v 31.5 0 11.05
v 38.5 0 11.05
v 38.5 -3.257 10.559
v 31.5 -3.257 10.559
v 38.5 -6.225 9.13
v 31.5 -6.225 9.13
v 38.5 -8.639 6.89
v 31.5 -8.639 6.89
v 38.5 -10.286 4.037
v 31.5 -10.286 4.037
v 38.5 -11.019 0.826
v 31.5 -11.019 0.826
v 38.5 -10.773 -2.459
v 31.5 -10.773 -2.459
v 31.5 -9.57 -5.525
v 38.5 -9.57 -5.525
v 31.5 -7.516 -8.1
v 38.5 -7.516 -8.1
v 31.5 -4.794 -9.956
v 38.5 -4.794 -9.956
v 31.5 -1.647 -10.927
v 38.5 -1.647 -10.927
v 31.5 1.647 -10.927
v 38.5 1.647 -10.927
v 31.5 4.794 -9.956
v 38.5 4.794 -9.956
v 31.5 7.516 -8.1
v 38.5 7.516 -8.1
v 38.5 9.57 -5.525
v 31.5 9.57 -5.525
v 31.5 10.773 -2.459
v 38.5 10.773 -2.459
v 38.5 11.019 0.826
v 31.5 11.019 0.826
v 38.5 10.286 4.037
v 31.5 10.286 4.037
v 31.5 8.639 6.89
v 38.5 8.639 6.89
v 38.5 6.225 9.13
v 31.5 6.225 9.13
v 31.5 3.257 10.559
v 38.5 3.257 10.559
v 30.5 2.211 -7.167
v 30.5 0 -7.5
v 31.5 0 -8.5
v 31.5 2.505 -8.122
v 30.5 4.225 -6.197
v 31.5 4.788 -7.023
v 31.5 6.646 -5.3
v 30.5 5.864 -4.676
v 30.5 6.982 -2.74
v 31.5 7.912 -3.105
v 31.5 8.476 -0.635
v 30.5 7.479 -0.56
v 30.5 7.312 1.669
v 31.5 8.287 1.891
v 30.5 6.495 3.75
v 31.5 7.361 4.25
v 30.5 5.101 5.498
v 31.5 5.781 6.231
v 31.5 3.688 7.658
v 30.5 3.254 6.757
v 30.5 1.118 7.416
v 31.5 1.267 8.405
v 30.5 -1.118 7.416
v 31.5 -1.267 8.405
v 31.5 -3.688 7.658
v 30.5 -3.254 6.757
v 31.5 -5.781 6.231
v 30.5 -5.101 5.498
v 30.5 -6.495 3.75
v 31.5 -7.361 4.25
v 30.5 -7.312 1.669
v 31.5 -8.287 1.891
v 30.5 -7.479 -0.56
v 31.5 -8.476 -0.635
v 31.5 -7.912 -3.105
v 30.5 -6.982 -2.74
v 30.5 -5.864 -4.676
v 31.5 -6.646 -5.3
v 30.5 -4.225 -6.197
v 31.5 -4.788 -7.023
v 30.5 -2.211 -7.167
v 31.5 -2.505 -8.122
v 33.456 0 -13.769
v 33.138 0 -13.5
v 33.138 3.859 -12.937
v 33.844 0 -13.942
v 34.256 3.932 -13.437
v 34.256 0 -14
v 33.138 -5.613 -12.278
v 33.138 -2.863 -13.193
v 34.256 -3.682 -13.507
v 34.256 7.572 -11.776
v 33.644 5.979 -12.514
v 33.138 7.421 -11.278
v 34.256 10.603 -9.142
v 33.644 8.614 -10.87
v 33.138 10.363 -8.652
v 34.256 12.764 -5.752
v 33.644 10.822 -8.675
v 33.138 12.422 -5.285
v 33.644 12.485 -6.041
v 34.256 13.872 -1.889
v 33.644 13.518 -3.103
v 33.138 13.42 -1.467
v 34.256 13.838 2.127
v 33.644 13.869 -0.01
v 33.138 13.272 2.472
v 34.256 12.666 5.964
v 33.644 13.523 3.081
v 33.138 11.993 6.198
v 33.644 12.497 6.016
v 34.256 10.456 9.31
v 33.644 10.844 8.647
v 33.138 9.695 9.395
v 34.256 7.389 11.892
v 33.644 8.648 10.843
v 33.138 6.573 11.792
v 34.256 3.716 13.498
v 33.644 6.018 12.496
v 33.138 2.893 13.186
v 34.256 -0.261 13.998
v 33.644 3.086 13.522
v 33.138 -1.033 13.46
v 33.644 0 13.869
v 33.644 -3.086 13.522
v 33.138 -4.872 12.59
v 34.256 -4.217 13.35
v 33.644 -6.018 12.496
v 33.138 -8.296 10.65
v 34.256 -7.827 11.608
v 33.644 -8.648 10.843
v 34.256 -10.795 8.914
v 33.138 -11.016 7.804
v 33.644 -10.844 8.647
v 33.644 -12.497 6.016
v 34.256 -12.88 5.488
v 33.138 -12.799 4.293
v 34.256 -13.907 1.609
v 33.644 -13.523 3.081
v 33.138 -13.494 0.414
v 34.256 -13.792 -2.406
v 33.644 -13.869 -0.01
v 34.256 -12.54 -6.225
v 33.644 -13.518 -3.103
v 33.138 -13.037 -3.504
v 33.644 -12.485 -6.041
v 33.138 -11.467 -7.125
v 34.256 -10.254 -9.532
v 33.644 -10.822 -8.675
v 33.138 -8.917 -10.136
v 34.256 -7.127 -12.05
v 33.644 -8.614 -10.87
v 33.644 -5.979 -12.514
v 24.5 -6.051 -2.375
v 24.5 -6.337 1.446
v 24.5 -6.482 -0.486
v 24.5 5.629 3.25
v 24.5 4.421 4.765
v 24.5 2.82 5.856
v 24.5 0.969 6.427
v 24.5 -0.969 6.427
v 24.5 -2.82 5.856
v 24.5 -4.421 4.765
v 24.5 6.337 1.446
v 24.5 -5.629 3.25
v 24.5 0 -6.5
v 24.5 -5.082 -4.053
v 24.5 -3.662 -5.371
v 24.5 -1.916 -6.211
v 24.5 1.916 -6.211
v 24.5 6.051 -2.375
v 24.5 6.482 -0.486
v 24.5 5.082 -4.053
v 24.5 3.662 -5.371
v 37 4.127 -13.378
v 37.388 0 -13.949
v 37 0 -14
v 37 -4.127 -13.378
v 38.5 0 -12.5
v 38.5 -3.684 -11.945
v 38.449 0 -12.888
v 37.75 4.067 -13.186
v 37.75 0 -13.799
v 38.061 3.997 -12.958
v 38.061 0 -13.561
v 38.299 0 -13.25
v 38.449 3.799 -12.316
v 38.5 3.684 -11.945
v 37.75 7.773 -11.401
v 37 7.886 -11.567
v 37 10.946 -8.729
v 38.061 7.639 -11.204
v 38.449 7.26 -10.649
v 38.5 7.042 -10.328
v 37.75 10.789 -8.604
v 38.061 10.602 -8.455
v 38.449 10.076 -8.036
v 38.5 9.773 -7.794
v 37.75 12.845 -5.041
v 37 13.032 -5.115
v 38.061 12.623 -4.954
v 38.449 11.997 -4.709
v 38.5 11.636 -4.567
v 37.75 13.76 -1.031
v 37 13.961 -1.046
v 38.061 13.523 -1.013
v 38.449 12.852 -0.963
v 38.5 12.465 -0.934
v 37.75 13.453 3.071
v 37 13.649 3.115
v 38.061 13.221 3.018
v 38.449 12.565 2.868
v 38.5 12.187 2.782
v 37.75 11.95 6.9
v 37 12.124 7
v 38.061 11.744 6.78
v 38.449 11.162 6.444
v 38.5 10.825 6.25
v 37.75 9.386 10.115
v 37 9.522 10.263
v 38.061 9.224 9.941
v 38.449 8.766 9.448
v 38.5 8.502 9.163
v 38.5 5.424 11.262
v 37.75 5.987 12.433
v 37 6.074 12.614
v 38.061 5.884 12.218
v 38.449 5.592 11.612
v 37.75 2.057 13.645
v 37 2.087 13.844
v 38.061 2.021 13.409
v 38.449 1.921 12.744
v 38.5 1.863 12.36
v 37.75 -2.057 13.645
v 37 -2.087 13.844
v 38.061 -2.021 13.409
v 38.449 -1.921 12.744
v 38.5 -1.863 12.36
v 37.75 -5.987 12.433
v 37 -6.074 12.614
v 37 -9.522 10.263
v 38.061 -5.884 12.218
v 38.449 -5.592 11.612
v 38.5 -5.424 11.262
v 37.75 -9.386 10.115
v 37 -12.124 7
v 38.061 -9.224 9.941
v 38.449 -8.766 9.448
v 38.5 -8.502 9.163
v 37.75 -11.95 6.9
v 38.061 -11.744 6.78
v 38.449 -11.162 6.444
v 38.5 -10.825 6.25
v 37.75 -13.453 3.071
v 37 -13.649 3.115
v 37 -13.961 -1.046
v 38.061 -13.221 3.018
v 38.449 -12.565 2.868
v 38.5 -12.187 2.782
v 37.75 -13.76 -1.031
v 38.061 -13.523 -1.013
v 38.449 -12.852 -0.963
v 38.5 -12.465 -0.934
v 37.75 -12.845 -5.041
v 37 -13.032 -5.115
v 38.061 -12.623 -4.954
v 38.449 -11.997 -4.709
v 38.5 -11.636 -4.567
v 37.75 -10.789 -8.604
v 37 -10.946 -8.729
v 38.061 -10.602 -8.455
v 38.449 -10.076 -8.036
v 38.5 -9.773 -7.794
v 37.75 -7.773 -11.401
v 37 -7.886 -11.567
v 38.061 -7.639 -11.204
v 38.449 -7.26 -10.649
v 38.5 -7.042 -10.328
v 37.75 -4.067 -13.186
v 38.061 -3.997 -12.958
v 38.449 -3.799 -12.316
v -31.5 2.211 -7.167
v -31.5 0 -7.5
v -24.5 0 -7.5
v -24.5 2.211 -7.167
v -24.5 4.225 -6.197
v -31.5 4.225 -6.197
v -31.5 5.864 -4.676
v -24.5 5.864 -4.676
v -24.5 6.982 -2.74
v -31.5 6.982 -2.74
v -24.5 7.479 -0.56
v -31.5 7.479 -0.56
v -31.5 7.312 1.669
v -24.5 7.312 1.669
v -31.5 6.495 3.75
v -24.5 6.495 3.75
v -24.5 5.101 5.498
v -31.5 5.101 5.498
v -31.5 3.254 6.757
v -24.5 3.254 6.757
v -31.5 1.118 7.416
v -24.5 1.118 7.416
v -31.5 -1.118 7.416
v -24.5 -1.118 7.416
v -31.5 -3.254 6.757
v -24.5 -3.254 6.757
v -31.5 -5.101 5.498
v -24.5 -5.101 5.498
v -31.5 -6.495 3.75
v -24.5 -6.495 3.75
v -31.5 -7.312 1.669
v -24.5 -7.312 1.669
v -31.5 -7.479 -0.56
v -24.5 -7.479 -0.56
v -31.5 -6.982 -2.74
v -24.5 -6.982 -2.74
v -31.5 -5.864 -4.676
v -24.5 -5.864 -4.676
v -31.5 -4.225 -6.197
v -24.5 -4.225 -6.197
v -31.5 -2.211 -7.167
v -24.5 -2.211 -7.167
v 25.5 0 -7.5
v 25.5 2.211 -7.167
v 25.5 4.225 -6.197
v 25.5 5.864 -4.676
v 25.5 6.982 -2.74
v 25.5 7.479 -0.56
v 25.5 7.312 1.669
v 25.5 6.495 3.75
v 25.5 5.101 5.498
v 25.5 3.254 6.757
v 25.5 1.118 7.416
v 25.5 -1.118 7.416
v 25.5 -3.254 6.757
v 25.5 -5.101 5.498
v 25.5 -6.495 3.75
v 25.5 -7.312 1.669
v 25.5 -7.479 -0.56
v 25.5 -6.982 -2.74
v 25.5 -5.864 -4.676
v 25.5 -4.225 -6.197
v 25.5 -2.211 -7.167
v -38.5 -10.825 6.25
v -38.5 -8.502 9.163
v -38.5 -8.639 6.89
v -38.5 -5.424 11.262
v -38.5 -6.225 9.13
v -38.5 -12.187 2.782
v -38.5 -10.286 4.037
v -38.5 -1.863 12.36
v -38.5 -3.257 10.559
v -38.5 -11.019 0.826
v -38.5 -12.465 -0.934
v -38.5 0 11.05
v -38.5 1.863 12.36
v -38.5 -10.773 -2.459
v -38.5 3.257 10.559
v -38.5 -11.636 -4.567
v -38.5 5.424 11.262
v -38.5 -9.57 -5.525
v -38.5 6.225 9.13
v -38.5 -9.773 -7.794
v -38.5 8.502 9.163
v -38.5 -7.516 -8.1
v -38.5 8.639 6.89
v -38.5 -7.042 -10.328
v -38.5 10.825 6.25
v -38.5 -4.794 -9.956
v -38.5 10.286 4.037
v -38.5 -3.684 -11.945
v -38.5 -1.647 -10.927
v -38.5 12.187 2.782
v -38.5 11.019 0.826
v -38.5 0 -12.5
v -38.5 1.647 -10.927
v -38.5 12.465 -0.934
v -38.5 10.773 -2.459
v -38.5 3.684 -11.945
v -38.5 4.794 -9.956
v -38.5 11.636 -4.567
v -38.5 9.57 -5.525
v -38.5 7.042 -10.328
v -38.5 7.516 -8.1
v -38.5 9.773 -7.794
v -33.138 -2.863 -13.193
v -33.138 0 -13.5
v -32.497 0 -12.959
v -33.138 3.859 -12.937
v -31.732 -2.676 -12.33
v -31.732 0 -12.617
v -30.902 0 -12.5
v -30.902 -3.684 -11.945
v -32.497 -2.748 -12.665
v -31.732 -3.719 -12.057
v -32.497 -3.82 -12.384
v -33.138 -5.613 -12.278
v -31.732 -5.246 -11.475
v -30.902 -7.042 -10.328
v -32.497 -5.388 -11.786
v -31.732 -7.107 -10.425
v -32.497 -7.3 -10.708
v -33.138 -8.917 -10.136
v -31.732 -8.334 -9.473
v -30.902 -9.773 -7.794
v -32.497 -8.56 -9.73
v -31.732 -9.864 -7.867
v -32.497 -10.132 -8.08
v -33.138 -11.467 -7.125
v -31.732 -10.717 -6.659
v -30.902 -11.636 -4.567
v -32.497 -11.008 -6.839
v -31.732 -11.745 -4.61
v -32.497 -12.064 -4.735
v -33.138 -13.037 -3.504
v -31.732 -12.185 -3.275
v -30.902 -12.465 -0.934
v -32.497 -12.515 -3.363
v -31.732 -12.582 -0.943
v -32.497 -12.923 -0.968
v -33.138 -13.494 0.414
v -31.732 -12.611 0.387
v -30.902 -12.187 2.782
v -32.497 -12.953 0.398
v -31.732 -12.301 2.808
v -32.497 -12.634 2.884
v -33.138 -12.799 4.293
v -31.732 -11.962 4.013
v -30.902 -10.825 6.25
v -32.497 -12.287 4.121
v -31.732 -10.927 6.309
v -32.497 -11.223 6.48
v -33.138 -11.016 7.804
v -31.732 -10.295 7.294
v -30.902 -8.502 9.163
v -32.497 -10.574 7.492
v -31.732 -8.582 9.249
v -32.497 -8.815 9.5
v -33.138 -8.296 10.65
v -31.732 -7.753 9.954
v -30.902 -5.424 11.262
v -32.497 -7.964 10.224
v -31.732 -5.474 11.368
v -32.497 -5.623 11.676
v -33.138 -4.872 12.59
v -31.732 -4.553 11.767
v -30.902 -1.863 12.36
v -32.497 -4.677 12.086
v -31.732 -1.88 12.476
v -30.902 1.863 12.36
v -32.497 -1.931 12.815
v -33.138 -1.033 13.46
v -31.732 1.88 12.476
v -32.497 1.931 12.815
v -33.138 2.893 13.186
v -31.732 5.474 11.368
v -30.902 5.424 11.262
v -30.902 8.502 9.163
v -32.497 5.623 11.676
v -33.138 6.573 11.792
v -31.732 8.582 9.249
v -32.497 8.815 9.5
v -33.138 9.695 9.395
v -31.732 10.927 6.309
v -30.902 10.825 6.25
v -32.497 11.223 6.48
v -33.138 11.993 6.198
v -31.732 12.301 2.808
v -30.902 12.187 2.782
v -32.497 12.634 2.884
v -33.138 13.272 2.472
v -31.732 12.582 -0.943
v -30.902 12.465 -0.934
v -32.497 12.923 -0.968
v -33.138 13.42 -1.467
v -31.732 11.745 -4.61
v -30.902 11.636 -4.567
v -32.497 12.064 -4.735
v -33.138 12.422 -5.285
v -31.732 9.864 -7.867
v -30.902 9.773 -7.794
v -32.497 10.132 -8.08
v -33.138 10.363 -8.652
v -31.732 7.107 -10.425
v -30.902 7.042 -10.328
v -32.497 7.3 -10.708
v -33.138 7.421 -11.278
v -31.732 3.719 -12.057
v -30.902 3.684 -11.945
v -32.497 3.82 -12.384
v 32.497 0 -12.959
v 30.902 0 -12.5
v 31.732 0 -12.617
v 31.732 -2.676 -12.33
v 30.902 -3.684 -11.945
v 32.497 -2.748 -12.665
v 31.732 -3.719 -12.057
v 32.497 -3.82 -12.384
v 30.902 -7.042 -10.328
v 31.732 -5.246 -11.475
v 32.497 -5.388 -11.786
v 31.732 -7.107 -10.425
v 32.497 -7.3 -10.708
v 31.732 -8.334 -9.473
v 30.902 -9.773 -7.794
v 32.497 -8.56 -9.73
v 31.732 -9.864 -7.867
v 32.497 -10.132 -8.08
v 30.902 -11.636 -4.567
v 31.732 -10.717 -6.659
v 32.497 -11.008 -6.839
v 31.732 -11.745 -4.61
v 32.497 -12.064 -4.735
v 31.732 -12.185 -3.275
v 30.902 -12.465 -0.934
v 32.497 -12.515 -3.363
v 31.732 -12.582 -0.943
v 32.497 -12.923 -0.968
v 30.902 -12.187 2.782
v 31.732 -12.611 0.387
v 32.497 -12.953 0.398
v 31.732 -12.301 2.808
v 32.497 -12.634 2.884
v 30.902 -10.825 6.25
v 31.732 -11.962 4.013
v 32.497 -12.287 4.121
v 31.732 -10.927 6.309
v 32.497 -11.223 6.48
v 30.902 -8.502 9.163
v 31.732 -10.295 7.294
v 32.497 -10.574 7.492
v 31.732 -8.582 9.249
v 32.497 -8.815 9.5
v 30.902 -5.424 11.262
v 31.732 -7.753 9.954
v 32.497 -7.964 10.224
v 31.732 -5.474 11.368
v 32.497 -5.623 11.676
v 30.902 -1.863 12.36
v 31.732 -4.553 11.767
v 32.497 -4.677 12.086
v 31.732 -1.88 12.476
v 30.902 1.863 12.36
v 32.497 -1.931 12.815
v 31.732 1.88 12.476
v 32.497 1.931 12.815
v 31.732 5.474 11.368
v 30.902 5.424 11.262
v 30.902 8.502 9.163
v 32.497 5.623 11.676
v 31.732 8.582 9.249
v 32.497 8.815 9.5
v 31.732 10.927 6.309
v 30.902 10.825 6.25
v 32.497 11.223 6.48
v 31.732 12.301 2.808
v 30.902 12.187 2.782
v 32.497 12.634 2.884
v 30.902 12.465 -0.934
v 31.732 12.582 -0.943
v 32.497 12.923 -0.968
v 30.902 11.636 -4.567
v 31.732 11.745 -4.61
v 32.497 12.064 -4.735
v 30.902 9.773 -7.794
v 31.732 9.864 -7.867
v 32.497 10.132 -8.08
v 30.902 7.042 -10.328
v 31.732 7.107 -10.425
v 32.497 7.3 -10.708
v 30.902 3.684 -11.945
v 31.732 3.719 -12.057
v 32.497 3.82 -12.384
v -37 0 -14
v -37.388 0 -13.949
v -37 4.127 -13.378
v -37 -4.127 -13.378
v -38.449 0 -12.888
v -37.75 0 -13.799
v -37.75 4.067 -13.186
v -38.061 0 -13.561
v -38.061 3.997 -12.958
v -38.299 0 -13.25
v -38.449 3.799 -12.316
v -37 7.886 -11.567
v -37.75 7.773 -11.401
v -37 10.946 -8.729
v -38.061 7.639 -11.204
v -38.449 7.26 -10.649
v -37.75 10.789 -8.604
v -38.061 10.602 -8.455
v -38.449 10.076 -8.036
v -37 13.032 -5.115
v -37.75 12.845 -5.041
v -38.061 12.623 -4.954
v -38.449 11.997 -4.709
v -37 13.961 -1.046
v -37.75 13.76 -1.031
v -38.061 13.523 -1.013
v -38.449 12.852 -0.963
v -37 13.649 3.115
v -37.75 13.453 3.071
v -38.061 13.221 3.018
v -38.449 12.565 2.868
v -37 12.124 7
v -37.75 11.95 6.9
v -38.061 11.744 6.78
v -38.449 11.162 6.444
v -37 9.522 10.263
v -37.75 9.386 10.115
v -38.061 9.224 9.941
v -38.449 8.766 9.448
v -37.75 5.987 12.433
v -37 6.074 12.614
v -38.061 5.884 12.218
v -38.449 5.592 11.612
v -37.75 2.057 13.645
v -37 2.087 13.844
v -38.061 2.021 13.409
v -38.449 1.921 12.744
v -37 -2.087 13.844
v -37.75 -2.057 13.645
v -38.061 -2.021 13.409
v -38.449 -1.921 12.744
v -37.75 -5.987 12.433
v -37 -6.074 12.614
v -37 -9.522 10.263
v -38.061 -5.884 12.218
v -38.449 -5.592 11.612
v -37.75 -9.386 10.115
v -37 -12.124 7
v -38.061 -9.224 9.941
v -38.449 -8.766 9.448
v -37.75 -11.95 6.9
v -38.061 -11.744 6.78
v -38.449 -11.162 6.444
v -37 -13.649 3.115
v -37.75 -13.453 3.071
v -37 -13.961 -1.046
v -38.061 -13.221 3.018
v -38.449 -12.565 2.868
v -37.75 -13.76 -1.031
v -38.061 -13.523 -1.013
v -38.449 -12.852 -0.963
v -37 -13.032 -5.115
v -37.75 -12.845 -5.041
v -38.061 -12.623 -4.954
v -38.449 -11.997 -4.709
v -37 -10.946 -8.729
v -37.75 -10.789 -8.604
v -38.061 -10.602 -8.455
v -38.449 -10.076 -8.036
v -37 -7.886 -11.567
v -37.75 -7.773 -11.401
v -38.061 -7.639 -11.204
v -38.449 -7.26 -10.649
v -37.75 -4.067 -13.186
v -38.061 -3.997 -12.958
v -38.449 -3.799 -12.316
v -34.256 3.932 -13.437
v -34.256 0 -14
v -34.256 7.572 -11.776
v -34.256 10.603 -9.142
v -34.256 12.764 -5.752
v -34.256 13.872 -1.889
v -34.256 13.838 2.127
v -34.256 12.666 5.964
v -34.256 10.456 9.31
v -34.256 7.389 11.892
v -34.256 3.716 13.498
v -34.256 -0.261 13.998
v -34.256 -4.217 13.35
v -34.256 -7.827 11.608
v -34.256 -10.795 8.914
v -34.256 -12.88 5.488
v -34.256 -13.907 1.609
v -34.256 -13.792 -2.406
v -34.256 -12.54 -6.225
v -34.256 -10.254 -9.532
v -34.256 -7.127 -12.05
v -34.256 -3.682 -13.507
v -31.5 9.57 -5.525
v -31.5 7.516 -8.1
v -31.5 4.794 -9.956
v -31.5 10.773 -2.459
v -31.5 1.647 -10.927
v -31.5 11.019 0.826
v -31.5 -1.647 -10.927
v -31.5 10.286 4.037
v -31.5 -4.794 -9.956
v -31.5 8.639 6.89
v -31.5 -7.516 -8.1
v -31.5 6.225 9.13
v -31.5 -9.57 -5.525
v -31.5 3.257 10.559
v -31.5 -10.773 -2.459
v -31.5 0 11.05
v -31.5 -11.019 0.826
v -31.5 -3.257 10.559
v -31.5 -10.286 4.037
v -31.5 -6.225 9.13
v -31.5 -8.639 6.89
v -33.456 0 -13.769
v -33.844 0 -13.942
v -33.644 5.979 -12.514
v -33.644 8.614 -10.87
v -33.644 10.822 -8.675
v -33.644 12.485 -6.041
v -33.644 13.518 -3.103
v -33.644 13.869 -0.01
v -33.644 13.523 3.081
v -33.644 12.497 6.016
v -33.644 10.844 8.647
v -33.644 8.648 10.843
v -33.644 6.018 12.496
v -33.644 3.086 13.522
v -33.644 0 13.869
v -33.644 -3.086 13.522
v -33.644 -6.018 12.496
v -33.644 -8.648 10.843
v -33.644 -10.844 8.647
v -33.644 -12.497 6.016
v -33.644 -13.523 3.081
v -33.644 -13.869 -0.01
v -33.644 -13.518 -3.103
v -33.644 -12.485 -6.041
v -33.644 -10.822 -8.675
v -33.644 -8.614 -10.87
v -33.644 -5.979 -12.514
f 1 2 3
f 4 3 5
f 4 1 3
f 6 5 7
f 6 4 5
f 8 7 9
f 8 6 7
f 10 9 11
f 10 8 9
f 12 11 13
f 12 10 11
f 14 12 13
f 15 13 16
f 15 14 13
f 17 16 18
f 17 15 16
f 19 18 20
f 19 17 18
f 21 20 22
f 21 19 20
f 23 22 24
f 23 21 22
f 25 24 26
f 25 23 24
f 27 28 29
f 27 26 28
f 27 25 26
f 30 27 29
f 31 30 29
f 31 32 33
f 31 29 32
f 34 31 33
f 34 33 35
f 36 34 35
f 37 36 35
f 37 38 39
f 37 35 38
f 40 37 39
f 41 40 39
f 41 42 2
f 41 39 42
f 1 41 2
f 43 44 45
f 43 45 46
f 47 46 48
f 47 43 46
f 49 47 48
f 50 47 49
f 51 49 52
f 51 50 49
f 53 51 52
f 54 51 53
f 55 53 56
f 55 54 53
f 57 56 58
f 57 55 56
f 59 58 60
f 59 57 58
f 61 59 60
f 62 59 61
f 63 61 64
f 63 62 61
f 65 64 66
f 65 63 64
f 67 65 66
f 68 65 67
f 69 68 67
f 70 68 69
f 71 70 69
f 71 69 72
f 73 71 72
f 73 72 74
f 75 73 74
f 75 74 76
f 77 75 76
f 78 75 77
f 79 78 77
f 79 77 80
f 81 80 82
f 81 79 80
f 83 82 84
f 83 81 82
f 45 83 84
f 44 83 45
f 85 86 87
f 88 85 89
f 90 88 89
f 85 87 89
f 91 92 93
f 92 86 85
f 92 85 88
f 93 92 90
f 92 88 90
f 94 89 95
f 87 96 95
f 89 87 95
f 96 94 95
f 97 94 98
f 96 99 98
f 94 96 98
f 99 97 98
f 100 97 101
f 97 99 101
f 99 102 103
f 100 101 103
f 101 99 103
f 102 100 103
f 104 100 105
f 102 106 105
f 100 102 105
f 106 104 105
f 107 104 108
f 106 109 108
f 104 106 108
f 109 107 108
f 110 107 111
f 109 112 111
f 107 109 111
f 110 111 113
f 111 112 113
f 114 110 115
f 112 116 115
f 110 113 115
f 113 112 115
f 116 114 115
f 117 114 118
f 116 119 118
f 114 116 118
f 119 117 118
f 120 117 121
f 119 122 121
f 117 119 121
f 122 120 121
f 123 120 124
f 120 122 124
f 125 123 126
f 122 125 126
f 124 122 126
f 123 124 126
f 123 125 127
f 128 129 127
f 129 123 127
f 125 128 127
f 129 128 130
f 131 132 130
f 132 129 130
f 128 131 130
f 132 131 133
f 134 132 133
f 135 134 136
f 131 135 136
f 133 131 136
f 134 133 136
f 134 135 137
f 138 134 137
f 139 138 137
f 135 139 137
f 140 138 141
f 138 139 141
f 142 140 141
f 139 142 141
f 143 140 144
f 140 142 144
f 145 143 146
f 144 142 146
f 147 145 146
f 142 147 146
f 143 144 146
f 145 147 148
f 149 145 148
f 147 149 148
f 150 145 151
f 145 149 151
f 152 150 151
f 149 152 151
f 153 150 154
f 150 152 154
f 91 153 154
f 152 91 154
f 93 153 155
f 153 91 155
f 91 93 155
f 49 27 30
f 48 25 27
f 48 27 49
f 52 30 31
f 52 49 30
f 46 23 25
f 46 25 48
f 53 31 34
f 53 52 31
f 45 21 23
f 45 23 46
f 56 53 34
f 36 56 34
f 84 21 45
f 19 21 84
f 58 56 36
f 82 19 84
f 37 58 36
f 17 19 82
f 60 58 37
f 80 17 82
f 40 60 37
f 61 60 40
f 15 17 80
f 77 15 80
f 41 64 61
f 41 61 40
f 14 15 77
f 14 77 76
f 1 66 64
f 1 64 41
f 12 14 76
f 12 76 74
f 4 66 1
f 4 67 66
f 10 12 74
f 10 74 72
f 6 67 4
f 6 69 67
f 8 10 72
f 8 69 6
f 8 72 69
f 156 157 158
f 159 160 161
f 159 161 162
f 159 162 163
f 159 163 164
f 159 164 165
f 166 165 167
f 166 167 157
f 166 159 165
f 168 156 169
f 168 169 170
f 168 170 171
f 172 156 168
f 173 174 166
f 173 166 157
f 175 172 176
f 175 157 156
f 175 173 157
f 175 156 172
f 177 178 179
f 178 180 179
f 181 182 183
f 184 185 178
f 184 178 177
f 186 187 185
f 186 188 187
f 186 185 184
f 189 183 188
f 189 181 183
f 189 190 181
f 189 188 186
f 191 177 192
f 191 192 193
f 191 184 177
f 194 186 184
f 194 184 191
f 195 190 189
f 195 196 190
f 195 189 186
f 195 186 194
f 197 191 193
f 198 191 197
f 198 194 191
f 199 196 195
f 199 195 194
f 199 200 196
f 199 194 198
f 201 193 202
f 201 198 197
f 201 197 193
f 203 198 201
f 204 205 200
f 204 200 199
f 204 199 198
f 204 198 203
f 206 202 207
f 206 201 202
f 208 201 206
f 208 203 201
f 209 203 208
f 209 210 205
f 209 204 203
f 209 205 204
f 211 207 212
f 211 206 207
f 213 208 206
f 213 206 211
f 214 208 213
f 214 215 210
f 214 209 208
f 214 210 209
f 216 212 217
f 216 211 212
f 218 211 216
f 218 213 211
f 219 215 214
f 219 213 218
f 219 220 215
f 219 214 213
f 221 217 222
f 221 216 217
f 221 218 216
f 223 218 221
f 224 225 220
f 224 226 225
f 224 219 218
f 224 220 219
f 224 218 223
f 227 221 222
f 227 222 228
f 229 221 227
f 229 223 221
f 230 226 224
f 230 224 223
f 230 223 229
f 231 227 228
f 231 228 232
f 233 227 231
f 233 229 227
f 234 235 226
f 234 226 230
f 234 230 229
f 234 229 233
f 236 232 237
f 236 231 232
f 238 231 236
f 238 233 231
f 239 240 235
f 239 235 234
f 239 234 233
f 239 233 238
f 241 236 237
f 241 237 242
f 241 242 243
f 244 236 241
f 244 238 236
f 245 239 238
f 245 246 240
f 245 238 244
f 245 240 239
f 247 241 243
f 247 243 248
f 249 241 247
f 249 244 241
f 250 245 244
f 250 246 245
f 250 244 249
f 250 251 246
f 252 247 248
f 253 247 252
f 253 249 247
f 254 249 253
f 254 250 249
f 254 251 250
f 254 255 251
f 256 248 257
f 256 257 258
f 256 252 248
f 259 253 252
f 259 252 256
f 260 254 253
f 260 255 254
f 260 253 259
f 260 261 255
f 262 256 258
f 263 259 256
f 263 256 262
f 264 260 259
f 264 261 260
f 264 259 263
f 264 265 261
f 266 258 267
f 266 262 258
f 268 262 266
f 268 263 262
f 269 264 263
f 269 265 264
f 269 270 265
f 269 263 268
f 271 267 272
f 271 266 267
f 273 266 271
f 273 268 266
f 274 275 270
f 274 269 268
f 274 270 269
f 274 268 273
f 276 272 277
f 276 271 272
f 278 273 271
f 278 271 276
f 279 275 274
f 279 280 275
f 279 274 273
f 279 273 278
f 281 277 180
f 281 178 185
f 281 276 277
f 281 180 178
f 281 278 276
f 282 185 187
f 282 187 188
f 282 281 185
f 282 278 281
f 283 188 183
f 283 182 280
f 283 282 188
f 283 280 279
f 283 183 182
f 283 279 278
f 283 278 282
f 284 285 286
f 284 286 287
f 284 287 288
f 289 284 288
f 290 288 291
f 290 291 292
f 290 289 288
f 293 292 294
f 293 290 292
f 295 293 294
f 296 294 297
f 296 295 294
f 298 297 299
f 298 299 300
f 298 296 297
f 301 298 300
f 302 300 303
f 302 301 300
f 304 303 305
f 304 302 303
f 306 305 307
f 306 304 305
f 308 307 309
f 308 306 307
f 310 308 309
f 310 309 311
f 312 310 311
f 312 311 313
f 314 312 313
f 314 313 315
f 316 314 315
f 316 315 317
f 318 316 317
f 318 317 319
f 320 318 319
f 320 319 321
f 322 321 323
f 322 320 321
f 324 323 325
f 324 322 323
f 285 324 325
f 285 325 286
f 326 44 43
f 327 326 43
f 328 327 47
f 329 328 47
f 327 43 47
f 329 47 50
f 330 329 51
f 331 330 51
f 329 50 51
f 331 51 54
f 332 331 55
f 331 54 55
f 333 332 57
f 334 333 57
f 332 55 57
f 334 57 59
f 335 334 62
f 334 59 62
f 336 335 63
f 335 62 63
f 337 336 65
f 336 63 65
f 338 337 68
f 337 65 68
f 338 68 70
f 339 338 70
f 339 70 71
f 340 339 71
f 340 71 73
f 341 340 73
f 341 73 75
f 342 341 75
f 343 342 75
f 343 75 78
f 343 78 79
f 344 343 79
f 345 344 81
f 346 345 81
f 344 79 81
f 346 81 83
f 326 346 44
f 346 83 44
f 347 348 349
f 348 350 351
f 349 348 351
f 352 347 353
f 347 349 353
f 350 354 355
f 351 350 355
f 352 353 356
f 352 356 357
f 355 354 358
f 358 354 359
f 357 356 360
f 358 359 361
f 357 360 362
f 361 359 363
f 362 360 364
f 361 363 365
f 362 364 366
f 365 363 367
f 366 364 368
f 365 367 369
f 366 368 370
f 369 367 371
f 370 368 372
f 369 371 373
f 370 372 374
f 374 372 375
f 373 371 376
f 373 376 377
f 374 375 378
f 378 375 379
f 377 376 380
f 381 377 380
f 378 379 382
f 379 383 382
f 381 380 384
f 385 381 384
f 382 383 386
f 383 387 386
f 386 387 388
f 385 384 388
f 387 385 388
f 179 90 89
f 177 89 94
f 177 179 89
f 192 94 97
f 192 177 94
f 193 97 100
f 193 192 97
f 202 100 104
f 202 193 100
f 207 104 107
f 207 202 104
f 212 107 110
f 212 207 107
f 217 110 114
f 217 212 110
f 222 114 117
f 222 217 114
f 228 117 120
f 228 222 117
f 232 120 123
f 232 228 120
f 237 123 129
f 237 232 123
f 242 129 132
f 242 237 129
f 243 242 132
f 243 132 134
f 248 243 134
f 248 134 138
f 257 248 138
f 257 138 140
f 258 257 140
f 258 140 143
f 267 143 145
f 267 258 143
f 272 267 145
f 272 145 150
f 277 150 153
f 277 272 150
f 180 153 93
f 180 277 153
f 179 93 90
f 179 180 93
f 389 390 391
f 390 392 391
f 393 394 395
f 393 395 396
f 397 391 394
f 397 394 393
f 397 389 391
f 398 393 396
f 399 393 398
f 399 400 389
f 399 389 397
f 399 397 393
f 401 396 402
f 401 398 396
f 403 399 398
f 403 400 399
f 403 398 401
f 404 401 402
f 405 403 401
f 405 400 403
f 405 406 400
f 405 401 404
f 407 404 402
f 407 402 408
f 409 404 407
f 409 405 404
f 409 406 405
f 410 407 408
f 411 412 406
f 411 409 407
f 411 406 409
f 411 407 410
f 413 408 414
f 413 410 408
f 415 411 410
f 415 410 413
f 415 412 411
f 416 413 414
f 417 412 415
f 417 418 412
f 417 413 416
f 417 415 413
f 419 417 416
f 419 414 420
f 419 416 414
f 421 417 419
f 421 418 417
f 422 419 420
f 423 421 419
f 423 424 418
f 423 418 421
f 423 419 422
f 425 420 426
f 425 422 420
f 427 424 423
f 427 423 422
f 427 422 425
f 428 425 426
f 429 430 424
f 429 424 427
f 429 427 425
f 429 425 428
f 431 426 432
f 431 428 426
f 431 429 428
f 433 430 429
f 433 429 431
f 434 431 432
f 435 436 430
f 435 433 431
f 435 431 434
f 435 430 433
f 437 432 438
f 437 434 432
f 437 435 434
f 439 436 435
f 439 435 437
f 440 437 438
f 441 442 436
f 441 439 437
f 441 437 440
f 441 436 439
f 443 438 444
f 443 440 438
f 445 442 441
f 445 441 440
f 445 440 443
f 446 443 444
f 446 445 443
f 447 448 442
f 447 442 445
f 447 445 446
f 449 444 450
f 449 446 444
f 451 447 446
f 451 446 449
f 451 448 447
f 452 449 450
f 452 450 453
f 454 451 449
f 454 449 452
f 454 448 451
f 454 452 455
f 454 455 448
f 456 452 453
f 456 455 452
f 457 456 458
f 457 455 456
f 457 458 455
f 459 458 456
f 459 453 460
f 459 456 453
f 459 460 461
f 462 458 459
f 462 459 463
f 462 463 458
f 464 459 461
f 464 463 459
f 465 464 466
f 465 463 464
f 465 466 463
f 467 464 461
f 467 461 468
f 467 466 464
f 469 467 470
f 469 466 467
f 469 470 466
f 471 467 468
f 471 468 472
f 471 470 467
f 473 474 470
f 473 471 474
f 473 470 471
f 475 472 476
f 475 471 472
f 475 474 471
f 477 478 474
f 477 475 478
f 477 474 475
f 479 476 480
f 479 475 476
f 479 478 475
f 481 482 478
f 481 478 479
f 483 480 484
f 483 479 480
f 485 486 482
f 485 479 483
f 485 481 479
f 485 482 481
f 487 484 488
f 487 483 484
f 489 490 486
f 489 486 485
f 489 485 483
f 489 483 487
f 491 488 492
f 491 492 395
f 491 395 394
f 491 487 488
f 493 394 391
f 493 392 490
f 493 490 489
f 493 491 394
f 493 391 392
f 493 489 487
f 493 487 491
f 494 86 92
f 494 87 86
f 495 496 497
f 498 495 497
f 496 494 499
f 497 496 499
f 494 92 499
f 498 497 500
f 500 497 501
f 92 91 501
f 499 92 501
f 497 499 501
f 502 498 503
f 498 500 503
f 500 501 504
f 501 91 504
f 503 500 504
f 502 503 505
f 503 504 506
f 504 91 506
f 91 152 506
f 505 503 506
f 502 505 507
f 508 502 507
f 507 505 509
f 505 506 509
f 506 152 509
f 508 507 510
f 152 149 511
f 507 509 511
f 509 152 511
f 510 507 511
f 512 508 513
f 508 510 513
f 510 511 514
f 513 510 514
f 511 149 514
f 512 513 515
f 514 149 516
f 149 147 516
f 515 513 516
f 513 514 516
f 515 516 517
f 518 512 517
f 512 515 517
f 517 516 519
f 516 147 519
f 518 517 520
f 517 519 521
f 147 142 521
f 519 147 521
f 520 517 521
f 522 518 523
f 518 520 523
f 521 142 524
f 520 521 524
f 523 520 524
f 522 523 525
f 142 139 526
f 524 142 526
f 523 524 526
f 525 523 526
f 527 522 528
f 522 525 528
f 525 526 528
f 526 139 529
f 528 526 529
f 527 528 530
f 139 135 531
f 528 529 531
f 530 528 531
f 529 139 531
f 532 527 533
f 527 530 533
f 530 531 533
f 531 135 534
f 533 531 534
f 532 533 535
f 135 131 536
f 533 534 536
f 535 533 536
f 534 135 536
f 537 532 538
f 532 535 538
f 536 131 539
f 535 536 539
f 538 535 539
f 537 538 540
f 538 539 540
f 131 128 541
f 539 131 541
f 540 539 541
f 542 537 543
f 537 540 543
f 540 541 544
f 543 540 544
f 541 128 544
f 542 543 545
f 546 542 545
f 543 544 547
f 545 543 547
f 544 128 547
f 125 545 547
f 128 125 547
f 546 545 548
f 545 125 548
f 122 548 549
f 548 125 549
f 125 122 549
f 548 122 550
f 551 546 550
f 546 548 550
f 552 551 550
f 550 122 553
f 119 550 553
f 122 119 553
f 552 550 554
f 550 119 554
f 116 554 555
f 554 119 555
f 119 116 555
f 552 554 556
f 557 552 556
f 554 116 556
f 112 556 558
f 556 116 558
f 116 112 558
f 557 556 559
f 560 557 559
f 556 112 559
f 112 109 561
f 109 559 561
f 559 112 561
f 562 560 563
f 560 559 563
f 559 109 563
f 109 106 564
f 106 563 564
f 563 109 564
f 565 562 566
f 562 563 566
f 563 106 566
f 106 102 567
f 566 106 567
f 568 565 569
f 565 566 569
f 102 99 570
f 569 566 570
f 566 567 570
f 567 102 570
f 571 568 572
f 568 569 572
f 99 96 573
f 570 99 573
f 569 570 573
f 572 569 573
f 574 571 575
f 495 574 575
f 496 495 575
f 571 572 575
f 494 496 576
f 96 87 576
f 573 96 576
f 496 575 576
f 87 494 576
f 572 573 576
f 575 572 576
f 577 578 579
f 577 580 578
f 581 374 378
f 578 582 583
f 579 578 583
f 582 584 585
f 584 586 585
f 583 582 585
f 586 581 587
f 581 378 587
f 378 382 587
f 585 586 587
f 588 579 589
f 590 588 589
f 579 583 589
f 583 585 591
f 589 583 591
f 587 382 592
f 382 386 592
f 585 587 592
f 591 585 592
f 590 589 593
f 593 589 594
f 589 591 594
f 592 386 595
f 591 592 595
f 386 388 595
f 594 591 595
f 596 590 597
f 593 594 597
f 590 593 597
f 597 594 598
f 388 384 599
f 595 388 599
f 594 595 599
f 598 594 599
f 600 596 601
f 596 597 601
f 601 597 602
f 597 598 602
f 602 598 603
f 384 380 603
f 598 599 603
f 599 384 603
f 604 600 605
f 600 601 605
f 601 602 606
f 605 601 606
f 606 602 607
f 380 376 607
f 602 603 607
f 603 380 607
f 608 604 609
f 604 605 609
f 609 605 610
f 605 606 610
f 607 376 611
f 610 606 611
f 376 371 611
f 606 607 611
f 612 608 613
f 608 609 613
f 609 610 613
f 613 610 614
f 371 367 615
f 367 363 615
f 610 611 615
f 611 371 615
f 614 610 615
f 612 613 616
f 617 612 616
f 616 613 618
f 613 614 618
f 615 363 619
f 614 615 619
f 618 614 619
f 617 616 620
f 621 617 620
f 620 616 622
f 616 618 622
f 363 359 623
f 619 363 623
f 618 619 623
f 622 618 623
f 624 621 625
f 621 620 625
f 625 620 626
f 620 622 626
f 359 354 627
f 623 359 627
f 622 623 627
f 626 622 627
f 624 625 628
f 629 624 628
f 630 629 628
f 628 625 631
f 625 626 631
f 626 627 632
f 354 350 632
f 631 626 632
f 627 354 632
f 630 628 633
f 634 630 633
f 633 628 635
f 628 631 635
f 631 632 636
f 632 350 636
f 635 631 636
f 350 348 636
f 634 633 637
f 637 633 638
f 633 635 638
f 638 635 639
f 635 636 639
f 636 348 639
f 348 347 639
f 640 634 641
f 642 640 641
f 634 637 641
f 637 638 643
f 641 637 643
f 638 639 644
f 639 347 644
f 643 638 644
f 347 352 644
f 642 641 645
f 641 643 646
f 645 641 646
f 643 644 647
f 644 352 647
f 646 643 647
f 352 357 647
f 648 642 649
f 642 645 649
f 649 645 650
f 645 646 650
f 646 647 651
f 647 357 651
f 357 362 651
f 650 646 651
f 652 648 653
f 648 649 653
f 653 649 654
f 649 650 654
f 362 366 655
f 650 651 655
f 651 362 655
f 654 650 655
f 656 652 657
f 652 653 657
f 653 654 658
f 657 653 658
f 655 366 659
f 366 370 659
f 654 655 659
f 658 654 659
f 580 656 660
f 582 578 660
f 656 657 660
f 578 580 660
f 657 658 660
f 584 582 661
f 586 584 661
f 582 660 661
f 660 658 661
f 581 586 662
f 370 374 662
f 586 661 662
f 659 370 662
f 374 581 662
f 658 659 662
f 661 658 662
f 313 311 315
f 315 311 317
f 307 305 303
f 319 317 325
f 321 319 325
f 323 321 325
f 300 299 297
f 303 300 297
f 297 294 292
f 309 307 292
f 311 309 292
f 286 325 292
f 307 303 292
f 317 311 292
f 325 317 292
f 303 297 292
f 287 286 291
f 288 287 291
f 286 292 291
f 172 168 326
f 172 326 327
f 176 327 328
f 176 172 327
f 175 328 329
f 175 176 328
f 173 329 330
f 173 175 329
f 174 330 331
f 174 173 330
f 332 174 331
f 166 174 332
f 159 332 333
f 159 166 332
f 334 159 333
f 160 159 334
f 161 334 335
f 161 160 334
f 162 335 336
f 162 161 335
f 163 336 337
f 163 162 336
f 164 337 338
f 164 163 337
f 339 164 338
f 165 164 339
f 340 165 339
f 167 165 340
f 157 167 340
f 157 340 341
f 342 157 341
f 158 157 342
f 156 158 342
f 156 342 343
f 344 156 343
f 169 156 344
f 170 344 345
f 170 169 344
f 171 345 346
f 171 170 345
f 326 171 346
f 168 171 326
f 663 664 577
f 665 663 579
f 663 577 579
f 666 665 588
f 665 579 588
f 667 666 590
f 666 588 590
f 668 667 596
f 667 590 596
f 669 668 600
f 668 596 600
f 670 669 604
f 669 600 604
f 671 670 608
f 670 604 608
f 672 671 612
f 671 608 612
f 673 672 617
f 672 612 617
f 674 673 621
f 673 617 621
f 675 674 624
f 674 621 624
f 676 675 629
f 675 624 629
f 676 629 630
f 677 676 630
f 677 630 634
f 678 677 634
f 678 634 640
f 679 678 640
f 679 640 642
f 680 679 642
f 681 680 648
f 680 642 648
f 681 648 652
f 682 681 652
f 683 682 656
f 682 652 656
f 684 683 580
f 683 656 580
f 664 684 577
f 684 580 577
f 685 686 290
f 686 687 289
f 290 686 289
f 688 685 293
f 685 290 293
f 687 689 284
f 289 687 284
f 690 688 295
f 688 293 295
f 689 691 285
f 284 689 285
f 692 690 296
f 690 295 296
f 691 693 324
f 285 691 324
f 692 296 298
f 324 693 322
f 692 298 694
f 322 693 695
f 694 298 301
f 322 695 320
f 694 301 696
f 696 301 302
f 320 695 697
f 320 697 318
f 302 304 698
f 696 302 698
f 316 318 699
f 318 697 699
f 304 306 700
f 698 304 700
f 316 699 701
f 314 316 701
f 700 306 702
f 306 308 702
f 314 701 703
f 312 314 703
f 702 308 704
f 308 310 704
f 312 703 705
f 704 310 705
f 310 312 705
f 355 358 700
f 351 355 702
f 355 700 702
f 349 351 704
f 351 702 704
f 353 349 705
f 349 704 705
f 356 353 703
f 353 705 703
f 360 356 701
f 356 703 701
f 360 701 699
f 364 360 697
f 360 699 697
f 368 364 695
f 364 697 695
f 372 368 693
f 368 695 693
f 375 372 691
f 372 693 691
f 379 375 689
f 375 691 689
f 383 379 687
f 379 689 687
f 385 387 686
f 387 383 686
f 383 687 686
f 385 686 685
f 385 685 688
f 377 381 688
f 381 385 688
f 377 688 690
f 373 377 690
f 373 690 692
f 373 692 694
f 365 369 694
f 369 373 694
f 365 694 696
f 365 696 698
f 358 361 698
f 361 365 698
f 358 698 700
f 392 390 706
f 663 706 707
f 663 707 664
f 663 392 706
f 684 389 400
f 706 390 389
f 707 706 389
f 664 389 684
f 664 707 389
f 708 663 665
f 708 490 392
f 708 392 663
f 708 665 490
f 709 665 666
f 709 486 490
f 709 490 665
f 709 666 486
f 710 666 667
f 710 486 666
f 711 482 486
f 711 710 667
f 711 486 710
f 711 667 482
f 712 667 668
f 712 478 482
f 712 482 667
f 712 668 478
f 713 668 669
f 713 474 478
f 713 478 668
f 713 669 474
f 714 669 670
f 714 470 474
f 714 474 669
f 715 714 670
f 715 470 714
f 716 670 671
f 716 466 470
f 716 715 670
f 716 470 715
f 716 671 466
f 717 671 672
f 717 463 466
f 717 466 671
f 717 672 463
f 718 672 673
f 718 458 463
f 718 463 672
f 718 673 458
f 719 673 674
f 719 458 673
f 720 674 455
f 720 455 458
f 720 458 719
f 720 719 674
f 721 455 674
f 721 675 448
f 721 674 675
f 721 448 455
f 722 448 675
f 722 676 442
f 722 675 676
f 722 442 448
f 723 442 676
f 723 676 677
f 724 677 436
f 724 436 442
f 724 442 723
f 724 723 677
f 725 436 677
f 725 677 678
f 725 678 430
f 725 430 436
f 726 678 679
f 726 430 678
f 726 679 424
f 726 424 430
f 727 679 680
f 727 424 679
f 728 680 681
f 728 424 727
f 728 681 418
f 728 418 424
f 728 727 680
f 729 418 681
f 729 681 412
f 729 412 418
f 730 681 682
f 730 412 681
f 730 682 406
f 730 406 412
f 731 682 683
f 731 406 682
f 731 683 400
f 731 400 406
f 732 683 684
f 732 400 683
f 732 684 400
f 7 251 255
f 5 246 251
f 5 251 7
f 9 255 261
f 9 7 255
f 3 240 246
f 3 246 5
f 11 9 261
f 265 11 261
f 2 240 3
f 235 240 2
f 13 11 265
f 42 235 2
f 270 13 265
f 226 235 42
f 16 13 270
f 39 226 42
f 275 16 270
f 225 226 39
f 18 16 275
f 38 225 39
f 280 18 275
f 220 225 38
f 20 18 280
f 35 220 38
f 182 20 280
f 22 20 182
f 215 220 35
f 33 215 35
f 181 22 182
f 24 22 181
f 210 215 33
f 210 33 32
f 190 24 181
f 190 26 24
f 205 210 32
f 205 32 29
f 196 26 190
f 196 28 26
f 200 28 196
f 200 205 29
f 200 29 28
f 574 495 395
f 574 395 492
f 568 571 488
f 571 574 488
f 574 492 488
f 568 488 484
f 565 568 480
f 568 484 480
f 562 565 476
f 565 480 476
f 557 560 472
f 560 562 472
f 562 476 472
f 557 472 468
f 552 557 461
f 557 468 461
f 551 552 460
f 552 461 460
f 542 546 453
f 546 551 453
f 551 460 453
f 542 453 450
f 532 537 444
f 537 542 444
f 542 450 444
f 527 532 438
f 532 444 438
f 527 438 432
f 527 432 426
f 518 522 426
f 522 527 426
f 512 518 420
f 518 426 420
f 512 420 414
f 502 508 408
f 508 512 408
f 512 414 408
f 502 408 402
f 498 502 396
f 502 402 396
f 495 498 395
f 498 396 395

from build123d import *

# Parameters (mm, degrees)
SKETCH1_R               = 12.5
BOSS_EXTRUDE2_DEPTH     = 38.5
SKETCH3_R               = 14
BOSS_EXTRUDE3_DEPTH     = 5
CUT_EXTRUDE1_DEPTH      = 44.292609069
CUT_EXTRUDE1_DEPTH_BACK = 7
SKETCH4_R               = 11.05
SKETCH5_R               = 7.5
CUT_EXTRUDE2_DEPTH      = 7
FILLET2_R               = 3
FILLET3_R               = 1.5
CHAMFER1_SIZE           = 1


with BuildPart() as part:
    # Sketch1 → Boss-Extrude2 (new body)
    with BuildSketch(Plane(origin=(0, 0, 0), x_dir=(0, 0, -1), z_dir=(1, 0, 0))):
        Circle(SKETCH1_R)
    extrude(amount=BOSS_EXTRUDE2_DEPTH)

    # Sketch3 → Boss-Extrude3 (add)
    with BuildSketch(Plane(origin=(38.5, 0, 0), x_dir=(0, 0, -1), z_dir=(1, 0, 0))):
        Circle(SKETCH3_R)
    extrude(amount=-BOSS_EXTRUDE3_DEPTH)

    # Sketch4 → Cut-Extrude1 (cut, two sides: drawn at the far end of the back side and taken through both)
    with BuildSketch(Plane(origin=(38.5, 0, 0), x_dir=(0, 0, -1), z_dir=(1, 0, 0)).offset(-CUT_EXTRUDE1_DEPTH_BACK)):
        with Locations(Location((0, 0, 0), (0, 0, 180))):
            Circle(SKETCH4_R)
    extrude(amount=CUT_EXTRUDE1_DEPTH + CUT_EXTRUDE1_DEPTH_BACK, mode=Mode.SUBTRACT)

    # Sketch5 → Cut-Extrude2 (cut)
    with BuildSketch(Plane(origin=(31.5, 0, 0), x_dir=(0, 0, -1), z_dir=(1, 0, 0))):
        Circle(SKETCH5_R)
    extrude(amount=-CUT_EXTRUDE2_DEPTH, mode=Mode.SUBTRACT)

    # Fillet2
    # the kernel refuses this fillet: 3 mm, written as the material it adds along each edge
    with BuildSketch(Plane(origin=(33.5, 0, 0), x_dir=(0, 0, -1), z_dir=(0, 1, 0))) as fillet2_piece_1:
        with BuildLine():
            CenterArc((15.5, 2.598076211), FILLET2_R, 180, 60)
            Line((14, 0), (13.97, -0.051961524))
            ThreePointArc((13.97, -0.051961524), (13.25, -0.06), (12.5, -0.06))
            Line((12.5, -0.06), (12.44, 0))
            Line((12.44, 0), (12.44, 2.598076211))
            Line((12.44, 2.598076211), (12.5, 2.598076211))
        make_face()
    revolve(axis=Axis((33.5, 0, 0), (-1, 0, 0)))

    # Fillet3
    fillet3_edges = [part.edges().sort_by_distance(p)[0] for p in [
        (33.5, 0, 14),
        (38.5, 0, 14),
    ]]
    fillet(fillet3_edges, radius=FILLET3_R)

    # Mirror1: part across plane


with BuildPart() as part_1:
    add(part.part)
    add(part.part.mirror(Plane(origin=(0, 0, 0), x_dir=(0, 0, 1), z_dir=(1, 0, 0))))

    # Chamfer1
    chamfer1_edges = [part_1.edges().sort_by_distance(p)[0] for p in [
        (24.5, 0, 7.5),
        (31.5, 0, 7.5),
    ]]
    chamfer(chamfer1_edges, length=CHAMFER1_SIZE)


solid = part_1.part
